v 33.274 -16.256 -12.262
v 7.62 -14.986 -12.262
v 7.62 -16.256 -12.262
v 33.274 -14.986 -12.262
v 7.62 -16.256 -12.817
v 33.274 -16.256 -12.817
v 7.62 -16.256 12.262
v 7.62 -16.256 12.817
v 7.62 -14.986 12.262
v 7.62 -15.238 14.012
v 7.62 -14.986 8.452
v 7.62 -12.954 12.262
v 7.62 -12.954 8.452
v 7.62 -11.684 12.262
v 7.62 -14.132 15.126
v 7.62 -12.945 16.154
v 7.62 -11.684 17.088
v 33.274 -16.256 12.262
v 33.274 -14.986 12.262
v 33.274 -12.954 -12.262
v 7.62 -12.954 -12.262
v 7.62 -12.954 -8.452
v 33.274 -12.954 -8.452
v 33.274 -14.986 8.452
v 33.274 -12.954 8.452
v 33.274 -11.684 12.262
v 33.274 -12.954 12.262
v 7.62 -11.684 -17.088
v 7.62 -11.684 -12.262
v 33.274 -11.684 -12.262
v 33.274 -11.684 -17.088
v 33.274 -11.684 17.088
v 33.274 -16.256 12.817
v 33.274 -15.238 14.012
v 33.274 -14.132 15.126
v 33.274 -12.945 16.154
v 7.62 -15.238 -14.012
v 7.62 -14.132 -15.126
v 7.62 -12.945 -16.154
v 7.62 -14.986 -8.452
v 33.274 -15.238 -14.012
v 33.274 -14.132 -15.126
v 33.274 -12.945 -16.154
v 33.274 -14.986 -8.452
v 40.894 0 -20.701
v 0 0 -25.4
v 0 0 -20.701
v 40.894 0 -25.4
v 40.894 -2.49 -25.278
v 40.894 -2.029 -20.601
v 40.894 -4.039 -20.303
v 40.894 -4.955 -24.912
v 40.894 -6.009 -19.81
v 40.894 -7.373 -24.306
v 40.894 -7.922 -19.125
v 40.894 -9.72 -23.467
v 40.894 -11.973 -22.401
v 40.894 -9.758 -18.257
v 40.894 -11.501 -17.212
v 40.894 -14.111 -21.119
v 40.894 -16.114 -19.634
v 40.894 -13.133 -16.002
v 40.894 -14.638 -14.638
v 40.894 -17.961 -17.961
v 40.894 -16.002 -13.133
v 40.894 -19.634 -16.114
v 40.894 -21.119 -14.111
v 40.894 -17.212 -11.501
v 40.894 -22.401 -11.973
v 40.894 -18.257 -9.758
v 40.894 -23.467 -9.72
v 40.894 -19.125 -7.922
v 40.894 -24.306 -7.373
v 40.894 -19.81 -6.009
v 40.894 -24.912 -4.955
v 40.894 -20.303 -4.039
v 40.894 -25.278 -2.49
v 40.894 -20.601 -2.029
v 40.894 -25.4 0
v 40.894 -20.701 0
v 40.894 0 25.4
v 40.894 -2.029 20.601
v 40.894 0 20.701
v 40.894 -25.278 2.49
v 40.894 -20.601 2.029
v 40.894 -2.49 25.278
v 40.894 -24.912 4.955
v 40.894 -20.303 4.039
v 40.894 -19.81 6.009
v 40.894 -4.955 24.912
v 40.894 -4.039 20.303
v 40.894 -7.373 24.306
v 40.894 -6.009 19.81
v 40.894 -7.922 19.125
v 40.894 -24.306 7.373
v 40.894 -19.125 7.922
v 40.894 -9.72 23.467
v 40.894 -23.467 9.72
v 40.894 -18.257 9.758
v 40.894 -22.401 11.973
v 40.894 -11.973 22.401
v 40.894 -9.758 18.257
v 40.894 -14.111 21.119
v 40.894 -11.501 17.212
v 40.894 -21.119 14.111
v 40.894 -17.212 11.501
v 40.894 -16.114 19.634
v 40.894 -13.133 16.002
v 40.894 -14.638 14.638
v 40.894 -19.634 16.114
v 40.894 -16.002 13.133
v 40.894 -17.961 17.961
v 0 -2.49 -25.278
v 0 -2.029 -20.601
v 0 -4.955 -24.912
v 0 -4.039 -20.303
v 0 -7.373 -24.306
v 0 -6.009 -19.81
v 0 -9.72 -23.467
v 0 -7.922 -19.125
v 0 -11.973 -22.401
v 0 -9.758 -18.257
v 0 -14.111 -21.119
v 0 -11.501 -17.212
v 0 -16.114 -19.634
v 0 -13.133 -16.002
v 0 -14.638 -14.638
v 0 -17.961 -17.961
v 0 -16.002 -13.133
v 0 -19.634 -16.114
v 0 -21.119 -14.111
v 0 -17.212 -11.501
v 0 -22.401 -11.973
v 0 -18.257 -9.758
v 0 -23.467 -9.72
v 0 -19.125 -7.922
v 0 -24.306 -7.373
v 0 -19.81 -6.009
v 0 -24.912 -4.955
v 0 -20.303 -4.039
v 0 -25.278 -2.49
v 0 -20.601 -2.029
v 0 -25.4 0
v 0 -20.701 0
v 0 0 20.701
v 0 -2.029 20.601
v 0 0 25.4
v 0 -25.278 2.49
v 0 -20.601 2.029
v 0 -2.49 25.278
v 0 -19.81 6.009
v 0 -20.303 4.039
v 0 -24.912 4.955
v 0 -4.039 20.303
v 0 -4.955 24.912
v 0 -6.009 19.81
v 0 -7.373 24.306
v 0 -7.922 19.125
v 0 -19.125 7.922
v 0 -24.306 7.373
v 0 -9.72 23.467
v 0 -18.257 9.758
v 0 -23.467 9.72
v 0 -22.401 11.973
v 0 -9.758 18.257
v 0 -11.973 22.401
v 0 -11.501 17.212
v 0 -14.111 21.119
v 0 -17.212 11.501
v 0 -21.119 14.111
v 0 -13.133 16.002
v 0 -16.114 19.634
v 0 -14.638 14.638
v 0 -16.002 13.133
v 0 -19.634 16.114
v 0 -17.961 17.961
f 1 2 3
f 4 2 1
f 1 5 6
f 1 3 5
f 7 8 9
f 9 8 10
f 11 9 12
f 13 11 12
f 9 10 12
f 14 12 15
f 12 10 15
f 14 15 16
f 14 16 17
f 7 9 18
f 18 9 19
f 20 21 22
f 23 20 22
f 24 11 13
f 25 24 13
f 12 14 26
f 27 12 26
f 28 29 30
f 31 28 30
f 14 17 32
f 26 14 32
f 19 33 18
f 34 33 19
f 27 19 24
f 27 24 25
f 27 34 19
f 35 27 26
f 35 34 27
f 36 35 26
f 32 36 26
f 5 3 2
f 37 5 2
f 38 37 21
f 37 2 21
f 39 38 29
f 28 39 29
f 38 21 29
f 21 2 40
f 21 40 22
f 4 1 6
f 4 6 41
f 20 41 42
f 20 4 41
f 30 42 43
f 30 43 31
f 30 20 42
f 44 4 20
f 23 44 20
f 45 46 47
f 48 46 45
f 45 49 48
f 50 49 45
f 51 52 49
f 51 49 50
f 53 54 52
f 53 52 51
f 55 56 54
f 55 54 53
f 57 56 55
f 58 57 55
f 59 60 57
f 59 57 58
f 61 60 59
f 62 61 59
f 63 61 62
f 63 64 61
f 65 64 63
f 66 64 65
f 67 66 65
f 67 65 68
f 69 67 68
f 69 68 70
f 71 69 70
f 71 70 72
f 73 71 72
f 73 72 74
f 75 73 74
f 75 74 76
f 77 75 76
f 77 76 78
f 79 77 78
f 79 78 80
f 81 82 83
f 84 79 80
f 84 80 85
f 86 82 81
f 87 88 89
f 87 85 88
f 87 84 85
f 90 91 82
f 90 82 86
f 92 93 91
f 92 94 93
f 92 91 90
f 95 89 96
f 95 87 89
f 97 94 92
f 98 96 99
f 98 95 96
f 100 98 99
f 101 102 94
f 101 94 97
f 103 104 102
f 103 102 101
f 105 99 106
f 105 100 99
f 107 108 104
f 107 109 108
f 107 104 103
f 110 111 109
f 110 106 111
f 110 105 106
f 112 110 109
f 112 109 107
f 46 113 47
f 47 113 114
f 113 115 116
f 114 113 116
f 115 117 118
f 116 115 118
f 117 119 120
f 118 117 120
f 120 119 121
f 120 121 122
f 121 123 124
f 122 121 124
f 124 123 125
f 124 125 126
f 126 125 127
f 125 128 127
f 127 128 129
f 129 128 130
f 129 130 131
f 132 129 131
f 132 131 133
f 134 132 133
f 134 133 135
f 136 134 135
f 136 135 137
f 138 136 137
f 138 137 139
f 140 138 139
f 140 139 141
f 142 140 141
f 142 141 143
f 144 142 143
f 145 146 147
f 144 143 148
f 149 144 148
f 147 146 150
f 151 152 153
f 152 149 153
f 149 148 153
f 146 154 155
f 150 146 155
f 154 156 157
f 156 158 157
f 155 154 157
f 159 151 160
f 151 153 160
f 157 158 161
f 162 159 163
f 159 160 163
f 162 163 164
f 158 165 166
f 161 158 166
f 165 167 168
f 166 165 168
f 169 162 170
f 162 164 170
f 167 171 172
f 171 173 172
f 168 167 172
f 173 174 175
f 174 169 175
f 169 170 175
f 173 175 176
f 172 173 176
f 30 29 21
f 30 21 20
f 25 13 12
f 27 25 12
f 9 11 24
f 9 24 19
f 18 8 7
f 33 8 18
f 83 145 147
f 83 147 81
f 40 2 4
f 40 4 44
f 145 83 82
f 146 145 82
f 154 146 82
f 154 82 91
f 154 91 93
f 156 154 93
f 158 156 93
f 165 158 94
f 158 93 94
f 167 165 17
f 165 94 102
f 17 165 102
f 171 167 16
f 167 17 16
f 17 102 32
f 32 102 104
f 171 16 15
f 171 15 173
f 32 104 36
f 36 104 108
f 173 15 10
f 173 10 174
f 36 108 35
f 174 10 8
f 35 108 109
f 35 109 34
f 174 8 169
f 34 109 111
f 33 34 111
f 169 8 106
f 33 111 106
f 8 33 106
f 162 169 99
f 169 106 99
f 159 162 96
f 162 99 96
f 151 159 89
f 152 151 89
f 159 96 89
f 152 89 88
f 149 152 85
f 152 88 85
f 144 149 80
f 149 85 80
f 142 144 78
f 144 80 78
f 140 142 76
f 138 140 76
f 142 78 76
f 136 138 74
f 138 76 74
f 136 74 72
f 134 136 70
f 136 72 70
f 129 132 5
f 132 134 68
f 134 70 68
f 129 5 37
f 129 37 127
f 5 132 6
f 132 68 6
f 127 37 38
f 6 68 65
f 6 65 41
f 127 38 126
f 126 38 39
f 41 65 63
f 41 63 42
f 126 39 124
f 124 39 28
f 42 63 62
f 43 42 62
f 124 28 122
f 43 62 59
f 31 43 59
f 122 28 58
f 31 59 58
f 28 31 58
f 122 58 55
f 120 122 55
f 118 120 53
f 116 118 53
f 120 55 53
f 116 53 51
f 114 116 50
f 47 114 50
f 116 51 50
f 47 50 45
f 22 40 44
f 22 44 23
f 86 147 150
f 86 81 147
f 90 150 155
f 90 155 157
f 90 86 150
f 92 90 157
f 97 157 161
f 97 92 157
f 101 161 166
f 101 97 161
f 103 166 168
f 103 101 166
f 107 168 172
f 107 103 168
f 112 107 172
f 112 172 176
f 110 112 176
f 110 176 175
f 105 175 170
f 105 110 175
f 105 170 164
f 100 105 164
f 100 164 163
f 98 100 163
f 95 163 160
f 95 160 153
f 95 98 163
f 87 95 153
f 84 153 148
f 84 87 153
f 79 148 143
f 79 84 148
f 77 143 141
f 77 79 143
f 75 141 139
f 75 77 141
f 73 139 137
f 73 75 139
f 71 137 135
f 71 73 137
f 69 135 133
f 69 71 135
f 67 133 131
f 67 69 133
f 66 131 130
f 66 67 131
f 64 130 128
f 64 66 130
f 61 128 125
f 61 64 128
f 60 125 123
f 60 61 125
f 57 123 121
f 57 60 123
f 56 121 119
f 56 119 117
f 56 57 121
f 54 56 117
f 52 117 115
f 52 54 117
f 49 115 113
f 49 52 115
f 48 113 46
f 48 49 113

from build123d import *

# Parameters (mm, degrees)
SKETCH1_W                       = 40.894
SKETCH1_H                       = 25.4
REVOLVE1_ANGLE                  = 180
BOSS_EXTRUDE1_REACH             = 27.4
SKETCH3_W                       = 25.654
SKETCH3_H                       = 4.572
BOSS_EXTRUDE1_DIRECTION_2_REACH = 27.4
SKETCH4_W                       = 25.654
SKETCH4_H                       = 24.524924672
CUT_EXTRUDE1_DEPTH              = 4.572
SKETCH5_W                       = 3.81
SKETCH5_H                       = 2.032
BOSS_EXTRUDE2_DEPTH             = 25.654


with BuildPart() as part:
    # Sketch1 → Revolve1 (revolve)
    with BuildSketch(Plane(origin=(0, 0, 0), x_dir=(1, 0, 0), z_dir=(0, 1, 0))):
        with Locations((20.447, -12.7)):
            Rectangle(SKETCH1_W, SKETCH1_H)
    revolve(axis=Axis((0, 0, 0), (1, 0, 0)), revolution_arc=REVOLVE1_ANGLE)

    # Sketch2 → Cut-Revolve1 (revolve, cut)
    with BuildSketch(Plane(origin=(0, 0, 0), x_dir=(1, 0, 0), z_dir=(0, 1, 0))):
        Polygon((0, 0), (41.402, 0), (41.402, -20.701), (40.132, -20.701), (1.27, -20.701), (0, -20.701), align=None)
    revolve(axis=Axis((0, 0, 0), (1, 0, 0)), mode=Mode.SUBTRACT)

    # Sketch3 → Boss-Extrude1 (add, up to next)
    with BuildSketch(Plane.XY, mode=Mode.PRIVATE) as boss_extrude1_sk1:
        with Locations((20.447, -13.97)):
            Rectangle(SKETCH3_W, SKETCH3_H)
    boss_extrude1_tool1 = extrude(boss_extrude1_sk1.sketch, amount=BOSS_EXTRUDE1_REACH, mode=Mode.PRIVATE) - part.part
    add(boss_extrude1_tool1.solids().sort_by_distance((20.447, -13.97, 0))[0])

    # Sketch3 → Boss-Extrude1 direction 2 (add, up to next)
    with BuildSketch(Plane.XY, mode=Mode.PRIVATE) as boss_extrude1_direction_2_sk1:
        with Locations((20.447, -13.97)):
            Rectangle(SKETCH3_W, SKETCH3_H)
    boss_extrude1_direction_2_tool1 = extrude(boss_extrude1_direction_2_sk1.sketch, amount=-BOSS_EXTRUDE1_DIRECTION_2_REACH, mode=Mode.PRIVATE) - part.part
    add(boss_extrude1_direction_2_tool1.solids().sort_by_distance((20.447, -13.97, 0))[0])

    # Sketch4 → Cut-Extrude1 (cut)
    with BuildSketch(Plane(origin=(0, -11.684, 0), x_dir=(1, 0, 0), z_dir=(0, 1, 0))):
        with Locations((20.447, 0)):
            Rectangle(SKETCH4_W, SKETCH4_H)
    extrude(amount=-CUT_EXTRUDE1_DEPTH, mode=Mode.SUBTRACT)

    # Sketch5 → Boss-Extrude2 (add)
    with BuildSketch(Plane.ZY.offset(-7.62)):
        with Locations((-10.357462336, -13.97)):
            Rectangle(SKETCH5_W, SKETCH5_H)
        with Locations((10.357462336, -13.97)):
            Rectangle(SKETCH5_W, SKETCH5_H)
    extrude(amount=-BOSS_EXTRUDE2_DEPTH)


solid = part.part
